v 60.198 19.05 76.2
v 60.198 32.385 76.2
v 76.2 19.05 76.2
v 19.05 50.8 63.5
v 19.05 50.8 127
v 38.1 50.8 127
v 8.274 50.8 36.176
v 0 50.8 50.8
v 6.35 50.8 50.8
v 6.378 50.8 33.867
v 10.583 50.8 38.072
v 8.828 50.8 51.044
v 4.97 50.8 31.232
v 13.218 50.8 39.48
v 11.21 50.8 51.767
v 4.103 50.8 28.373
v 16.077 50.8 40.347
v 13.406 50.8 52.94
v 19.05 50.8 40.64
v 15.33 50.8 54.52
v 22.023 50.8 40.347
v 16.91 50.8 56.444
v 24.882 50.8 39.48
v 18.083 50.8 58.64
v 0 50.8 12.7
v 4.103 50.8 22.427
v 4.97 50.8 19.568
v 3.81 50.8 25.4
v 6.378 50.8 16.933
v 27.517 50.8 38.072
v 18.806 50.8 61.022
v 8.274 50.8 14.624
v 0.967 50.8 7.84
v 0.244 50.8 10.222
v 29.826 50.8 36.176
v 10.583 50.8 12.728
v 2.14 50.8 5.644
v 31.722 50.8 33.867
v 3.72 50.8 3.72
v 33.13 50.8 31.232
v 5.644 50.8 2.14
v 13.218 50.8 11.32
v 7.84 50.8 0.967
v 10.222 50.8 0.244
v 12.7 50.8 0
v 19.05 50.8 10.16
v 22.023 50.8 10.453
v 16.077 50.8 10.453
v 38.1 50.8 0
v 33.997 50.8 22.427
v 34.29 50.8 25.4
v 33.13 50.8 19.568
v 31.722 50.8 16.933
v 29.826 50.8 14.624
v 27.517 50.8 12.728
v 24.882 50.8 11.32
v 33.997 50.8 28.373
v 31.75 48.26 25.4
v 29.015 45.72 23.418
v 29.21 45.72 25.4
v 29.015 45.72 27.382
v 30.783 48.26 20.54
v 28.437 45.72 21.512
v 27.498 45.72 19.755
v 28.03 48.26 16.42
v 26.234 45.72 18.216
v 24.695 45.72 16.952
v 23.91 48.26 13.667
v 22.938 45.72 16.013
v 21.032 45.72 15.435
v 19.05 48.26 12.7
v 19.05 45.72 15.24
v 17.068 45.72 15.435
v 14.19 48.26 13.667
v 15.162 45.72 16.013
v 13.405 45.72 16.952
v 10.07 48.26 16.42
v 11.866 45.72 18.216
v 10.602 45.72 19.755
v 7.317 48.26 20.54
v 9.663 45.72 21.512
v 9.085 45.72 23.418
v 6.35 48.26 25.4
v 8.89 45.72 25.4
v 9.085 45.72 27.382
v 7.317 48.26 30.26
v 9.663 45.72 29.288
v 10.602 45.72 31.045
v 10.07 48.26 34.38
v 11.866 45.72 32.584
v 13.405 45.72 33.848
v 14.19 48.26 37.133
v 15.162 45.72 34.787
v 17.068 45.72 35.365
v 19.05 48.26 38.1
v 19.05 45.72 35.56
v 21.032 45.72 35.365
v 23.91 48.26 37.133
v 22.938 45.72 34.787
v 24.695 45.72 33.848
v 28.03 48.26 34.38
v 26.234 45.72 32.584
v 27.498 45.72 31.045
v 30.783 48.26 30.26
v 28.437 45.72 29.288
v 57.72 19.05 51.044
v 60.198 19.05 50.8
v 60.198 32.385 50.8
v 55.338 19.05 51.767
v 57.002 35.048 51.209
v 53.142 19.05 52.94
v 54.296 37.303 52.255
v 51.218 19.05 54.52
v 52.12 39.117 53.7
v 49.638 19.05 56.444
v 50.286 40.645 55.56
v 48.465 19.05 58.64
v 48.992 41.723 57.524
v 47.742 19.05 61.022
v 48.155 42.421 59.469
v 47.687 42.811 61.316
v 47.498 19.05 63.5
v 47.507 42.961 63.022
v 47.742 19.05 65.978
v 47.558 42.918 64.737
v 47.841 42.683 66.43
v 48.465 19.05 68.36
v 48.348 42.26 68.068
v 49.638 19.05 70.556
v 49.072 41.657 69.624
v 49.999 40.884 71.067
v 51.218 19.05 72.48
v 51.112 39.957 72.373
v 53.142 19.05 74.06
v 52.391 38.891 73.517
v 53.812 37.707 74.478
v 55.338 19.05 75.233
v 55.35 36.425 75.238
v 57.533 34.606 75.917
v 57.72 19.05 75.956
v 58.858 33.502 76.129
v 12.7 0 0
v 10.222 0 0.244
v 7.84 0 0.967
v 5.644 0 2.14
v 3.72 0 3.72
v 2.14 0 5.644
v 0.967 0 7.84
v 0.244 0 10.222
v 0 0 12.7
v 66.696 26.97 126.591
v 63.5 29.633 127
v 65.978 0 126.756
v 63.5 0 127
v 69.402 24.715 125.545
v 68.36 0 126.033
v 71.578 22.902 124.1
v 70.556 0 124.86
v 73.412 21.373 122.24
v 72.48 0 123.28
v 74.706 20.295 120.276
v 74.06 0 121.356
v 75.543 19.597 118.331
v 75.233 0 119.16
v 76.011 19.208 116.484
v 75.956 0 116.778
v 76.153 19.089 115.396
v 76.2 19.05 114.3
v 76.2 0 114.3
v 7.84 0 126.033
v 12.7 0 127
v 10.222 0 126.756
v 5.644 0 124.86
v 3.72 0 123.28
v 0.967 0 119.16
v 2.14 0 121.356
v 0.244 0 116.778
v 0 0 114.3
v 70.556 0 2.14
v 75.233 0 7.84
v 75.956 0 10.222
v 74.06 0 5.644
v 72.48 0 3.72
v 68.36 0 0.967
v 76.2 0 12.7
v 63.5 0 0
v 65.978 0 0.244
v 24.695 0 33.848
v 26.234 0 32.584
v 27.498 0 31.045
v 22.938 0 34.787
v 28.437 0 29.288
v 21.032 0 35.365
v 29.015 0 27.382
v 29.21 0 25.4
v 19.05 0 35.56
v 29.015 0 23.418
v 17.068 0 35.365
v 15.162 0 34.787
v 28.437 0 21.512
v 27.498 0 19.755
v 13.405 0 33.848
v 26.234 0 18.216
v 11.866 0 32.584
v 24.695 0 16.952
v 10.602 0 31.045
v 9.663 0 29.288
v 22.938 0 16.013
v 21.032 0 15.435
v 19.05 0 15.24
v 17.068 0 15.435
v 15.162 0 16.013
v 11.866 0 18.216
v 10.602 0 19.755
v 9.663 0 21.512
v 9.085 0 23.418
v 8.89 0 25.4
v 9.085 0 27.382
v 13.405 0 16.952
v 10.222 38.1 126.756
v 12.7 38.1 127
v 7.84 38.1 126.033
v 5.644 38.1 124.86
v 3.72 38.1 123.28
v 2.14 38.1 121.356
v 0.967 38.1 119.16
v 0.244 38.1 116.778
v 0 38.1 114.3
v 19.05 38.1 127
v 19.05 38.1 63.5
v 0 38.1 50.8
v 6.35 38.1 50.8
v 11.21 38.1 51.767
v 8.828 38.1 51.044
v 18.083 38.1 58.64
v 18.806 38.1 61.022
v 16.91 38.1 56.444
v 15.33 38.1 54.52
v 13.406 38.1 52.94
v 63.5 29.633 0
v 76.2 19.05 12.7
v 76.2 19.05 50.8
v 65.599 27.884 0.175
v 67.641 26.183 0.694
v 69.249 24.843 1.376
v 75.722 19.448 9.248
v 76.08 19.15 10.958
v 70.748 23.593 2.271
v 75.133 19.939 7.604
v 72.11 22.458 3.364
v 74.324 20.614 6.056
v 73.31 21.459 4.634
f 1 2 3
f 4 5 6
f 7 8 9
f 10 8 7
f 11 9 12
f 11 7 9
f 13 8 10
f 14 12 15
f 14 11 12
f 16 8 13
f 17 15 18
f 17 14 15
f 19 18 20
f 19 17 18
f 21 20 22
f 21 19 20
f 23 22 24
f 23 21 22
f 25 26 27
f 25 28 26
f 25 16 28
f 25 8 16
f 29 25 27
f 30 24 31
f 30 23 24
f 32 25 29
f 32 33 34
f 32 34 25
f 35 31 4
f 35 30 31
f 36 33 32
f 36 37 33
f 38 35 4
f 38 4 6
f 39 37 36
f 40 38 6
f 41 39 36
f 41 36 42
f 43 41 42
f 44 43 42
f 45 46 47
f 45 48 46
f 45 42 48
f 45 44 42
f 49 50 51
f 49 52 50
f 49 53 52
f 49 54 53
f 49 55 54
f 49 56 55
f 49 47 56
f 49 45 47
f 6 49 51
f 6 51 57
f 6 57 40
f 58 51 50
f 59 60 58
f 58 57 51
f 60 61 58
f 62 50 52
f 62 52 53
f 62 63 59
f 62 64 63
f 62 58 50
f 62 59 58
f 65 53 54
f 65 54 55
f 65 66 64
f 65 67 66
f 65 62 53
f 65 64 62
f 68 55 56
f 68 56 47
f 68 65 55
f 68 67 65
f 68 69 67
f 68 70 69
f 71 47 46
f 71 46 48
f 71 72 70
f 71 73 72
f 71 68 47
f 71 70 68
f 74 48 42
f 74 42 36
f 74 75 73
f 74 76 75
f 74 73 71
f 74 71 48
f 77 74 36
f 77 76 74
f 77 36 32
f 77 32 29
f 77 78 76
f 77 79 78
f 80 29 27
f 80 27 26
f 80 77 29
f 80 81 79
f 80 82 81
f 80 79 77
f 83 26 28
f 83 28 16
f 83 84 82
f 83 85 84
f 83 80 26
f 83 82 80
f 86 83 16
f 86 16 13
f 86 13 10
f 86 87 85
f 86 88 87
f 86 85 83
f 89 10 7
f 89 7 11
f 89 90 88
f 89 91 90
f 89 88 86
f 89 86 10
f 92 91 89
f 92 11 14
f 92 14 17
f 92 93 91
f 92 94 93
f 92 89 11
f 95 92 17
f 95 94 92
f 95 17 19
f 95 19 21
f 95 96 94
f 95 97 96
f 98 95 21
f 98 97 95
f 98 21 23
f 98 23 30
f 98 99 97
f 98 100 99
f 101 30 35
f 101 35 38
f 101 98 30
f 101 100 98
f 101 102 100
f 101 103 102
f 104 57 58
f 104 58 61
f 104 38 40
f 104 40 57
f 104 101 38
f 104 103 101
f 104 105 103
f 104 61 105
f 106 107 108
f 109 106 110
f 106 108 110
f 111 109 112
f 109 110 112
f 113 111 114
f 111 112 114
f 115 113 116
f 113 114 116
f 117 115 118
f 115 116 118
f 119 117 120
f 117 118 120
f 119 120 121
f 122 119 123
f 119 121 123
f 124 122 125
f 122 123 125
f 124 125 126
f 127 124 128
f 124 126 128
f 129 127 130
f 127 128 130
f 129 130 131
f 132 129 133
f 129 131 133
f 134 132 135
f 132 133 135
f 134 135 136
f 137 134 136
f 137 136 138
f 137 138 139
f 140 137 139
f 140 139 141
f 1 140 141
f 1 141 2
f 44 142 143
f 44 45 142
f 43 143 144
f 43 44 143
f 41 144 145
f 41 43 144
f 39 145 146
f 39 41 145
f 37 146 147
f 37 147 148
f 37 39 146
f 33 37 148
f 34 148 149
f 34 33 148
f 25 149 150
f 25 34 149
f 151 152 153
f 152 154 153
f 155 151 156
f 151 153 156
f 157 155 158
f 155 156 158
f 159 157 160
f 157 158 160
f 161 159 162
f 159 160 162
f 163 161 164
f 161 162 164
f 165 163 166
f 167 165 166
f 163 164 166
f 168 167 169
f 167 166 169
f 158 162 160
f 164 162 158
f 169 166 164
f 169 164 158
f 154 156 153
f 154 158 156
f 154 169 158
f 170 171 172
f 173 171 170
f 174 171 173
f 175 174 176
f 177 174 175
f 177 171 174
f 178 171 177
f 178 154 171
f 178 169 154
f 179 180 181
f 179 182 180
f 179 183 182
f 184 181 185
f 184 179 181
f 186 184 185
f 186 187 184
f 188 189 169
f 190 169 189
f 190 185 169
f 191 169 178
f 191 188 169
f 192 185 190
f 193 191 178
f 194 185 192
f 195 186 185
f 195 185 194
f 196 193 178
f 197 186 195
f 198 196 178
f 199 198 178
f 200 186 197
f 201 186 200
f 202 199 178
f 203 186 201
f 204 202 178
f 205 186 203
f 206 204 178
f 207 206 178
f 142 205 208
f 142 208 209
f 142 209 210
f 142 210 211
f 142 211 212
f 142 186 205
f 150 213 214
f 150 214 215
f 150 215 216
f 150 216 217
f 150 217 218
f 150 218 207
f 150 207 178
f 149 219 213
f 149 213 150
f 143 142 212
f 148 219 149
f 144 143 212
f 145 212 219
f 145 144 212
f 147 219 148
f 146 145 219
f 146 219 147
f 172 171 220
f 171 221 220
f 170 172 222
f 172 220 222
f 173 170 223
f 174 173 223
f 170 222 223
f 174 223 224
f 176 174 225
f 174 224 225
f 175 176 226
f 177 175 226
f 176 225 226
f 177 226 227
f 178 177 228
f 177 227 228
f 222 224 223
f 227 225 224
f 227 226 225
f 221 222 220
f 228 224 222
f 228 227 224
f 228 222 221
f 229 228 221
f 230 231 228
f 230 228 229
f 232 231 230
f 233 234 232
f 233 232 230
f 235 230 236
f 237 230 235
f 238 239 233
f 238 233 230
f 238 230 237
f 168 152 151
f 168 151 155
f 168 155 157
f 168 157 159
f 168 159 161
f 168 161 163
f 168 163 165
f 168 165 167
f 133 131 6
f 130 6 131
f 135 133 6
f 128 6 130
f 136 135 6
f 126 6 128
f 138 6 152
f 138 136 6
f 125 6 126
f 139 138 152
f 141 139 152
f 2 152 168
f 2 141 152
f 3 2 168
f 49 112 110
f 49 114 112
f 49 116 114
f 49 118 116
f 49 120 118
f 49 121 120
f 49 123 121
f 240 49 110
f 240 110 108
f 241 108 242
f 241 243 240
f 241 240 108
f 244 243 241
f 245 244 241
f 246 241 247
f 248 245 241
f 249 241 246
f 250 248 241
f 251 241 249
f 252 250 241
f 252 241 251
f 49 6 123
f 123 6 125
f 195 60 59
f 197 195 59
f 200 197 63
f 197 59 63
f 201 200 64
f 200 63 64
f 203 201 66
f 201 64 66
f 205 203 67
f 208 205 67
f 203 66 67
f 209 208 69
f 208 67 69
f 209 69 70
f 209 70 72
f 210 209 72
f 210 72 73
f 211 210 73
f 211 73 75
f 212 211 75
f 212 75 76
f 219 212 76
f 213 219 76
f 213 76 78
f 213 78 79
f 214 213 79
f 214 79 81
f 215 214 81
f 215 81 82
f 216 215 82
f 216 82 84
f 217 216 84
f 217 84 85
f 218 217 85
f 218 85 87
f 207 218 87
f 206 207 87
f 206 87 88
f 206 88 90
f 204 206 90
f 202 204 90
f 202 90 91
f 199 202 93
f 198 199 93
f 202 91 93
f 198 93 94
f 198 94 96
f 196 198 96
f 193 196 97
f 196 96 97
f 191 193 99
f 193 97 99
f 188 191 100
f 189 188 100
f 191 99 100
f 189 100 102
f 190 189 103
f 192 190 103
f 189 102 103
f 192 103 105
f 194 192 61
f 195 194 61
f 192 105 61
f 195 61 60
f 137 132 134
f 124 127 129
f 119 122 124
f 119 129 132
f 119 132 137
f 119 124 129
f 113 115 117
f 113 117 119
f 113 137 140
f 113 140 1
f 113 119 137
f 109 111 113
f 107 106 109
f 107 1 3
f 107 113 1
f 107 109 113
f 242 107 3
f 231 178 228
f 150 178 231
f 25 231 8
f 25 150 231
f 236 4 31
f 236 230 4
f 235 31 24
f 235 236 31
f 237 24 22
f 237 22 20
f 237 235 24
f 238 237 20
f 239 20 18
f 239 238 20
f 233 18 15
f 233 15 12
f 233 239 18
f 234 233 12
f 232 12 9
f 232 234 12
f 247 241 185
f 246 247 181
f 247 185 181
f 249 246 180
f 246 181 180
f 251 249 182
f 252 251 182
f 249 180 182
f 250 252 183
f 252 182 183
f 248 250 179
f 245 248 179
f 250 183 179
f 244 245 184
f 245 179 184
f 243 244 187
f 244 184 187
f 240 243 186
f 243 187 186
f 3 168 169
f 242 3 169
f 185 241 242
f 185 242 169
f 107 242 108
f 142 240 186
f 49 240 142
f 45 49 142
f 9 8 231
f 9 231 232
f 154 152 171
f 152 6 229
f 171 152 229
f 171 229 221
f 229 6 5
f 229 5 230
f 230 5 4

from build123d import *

# Parameters (mm, degrees)
BOSS_EXTRUDE1_DEPTH     = 127
SKETCH3_R               = 10.16
CUT_EXTRUDE1_DEPTH      = 127
CHAMFER1_SIZE           = 5.08
SKETCH4_W               = 19.05
SKETCH4_H               = 76.2
CUT_EXTRUDE3_DEPTH      = 1
CUT_EXTRUDE3_DEPTH_BACK = 12.7
FILLET1_R               = 12.7
CUT_EXTRUDE4_DEPTH      = 31.75
FILLET2_R               = 12.7
FILLET3_R               = 12.7
FILLET4_R               = 12.7
FILLET5_R               = 12.7


with BuildPart() as part:
    # Sketch1 → Boss-Extrude1 (new body)
    with BuildSketch(Plane.XY):
        Polygon((0, 0), (0, 50.8), (38.1, 50.8), (76.2, 19.05), (76.2, 0), align=None)
    extrude(amount=BOSS_EXTRUDE1_DEPTH)

    # Sketch3 → Cut-Extrude1 (cut)
    with BuildSketch(Plane(origin=(0, 50.8, 0), x_dir=(1, 0, 0), z_dir=(0, 1, 0))):
        with Locations((19.05, -25.4)):
            Circle(SKETCH3_R)
    extrude(amount=-CUT_EXTRUDE1_DEPTH, mode=Mode.SUBTRACT)

    # Chamfer1
    chamfer1_edges = [part.edges().sort_by_distance(p)[0] for p in [
        (8.89, 50.8, 25.4),
    ]]
    chamfer(chamfer1_edges, length=CHAMFER1_SIZE)

    # Sketch4 → Cut-Extrude3 (cut, two sides)
    with BuildSketch(Plane(origin=(0, 50.8, 0), x_dir=(1, 0, 0), z_dir=(0, 1, 0))) as cut_extrude3_sk:
        with Locations((9.525, -88.9)):
            Rectangle(SKETCH4_W, SKETCH4_H)
    extrude(amount=CUT_EXTRUDE3_DEPTH, mode=Mode.SUBTRACT)
    extrude(cut_extrude3_sk.sketch, amount=-CUT_EXTRUDE3_DEPTH_BACK, mode=Mode.SUBTRACT)

    # Fillet1
    fillet1_edges = [part.edges().sort_by_distance(p)[0] for p in [
        (19.05, 44.45, 50.8),
    ]]
    fillet(fillet1_edges, radius=FILLET1_R)

    # Sketch5 → Cut-Extrude4 (cut)
    with BuildSketch(Plane(origin=(0, 50.8, 0), x_dir=(1, 0, 0), z_dir=(0, 1, 0))):
        with BuildLine():
            Line((76.2, -50.8), (60.198, -50.8))
            ThreePointArc((60.198, -50.8), (47.498, -63.5), (60.198, -76.2))
            Line((60.198, -76.2), (76.2, -76.2))
            Line((76.2, -76.2), (76.2, -50.8))
        make_face()
    extrude(amount=-CUT_EXTRUDE4_DEPTH, mode=Mode.SUBTRACT)

    # Fillet2
    fillet2_edges = [part.edges().sort_by_distance(p)[0] for p in [
        (0, 19.05, 127),
    ]]
    fillet(fillet2_edges, radius=FILLET2_R)

    # Fillet3
    fillet3_edges = [part.edges().sort_by_distance(p)[0] for p in [
        (76.2, 9.525, 127),
    ]]
    fillet(fillet3_edges, radius=FILLET3_R)

    # Fillet4
    fillet4_edges = [part.edges().sort_by_distance(p)[0] for p in [
        (76.2, 9.525, 0),
    ]]
    fillet(fillet4_edges, radius=FILLET4_R)

    # Fillet5
    fillet5_edges = [part.edges().sort_by_distance(p)[0] for p in [
        (0, 25.4, 0),
    ]]
    fillet(fillet5_edges, radius=FILLET5_R)


solid = part.part
